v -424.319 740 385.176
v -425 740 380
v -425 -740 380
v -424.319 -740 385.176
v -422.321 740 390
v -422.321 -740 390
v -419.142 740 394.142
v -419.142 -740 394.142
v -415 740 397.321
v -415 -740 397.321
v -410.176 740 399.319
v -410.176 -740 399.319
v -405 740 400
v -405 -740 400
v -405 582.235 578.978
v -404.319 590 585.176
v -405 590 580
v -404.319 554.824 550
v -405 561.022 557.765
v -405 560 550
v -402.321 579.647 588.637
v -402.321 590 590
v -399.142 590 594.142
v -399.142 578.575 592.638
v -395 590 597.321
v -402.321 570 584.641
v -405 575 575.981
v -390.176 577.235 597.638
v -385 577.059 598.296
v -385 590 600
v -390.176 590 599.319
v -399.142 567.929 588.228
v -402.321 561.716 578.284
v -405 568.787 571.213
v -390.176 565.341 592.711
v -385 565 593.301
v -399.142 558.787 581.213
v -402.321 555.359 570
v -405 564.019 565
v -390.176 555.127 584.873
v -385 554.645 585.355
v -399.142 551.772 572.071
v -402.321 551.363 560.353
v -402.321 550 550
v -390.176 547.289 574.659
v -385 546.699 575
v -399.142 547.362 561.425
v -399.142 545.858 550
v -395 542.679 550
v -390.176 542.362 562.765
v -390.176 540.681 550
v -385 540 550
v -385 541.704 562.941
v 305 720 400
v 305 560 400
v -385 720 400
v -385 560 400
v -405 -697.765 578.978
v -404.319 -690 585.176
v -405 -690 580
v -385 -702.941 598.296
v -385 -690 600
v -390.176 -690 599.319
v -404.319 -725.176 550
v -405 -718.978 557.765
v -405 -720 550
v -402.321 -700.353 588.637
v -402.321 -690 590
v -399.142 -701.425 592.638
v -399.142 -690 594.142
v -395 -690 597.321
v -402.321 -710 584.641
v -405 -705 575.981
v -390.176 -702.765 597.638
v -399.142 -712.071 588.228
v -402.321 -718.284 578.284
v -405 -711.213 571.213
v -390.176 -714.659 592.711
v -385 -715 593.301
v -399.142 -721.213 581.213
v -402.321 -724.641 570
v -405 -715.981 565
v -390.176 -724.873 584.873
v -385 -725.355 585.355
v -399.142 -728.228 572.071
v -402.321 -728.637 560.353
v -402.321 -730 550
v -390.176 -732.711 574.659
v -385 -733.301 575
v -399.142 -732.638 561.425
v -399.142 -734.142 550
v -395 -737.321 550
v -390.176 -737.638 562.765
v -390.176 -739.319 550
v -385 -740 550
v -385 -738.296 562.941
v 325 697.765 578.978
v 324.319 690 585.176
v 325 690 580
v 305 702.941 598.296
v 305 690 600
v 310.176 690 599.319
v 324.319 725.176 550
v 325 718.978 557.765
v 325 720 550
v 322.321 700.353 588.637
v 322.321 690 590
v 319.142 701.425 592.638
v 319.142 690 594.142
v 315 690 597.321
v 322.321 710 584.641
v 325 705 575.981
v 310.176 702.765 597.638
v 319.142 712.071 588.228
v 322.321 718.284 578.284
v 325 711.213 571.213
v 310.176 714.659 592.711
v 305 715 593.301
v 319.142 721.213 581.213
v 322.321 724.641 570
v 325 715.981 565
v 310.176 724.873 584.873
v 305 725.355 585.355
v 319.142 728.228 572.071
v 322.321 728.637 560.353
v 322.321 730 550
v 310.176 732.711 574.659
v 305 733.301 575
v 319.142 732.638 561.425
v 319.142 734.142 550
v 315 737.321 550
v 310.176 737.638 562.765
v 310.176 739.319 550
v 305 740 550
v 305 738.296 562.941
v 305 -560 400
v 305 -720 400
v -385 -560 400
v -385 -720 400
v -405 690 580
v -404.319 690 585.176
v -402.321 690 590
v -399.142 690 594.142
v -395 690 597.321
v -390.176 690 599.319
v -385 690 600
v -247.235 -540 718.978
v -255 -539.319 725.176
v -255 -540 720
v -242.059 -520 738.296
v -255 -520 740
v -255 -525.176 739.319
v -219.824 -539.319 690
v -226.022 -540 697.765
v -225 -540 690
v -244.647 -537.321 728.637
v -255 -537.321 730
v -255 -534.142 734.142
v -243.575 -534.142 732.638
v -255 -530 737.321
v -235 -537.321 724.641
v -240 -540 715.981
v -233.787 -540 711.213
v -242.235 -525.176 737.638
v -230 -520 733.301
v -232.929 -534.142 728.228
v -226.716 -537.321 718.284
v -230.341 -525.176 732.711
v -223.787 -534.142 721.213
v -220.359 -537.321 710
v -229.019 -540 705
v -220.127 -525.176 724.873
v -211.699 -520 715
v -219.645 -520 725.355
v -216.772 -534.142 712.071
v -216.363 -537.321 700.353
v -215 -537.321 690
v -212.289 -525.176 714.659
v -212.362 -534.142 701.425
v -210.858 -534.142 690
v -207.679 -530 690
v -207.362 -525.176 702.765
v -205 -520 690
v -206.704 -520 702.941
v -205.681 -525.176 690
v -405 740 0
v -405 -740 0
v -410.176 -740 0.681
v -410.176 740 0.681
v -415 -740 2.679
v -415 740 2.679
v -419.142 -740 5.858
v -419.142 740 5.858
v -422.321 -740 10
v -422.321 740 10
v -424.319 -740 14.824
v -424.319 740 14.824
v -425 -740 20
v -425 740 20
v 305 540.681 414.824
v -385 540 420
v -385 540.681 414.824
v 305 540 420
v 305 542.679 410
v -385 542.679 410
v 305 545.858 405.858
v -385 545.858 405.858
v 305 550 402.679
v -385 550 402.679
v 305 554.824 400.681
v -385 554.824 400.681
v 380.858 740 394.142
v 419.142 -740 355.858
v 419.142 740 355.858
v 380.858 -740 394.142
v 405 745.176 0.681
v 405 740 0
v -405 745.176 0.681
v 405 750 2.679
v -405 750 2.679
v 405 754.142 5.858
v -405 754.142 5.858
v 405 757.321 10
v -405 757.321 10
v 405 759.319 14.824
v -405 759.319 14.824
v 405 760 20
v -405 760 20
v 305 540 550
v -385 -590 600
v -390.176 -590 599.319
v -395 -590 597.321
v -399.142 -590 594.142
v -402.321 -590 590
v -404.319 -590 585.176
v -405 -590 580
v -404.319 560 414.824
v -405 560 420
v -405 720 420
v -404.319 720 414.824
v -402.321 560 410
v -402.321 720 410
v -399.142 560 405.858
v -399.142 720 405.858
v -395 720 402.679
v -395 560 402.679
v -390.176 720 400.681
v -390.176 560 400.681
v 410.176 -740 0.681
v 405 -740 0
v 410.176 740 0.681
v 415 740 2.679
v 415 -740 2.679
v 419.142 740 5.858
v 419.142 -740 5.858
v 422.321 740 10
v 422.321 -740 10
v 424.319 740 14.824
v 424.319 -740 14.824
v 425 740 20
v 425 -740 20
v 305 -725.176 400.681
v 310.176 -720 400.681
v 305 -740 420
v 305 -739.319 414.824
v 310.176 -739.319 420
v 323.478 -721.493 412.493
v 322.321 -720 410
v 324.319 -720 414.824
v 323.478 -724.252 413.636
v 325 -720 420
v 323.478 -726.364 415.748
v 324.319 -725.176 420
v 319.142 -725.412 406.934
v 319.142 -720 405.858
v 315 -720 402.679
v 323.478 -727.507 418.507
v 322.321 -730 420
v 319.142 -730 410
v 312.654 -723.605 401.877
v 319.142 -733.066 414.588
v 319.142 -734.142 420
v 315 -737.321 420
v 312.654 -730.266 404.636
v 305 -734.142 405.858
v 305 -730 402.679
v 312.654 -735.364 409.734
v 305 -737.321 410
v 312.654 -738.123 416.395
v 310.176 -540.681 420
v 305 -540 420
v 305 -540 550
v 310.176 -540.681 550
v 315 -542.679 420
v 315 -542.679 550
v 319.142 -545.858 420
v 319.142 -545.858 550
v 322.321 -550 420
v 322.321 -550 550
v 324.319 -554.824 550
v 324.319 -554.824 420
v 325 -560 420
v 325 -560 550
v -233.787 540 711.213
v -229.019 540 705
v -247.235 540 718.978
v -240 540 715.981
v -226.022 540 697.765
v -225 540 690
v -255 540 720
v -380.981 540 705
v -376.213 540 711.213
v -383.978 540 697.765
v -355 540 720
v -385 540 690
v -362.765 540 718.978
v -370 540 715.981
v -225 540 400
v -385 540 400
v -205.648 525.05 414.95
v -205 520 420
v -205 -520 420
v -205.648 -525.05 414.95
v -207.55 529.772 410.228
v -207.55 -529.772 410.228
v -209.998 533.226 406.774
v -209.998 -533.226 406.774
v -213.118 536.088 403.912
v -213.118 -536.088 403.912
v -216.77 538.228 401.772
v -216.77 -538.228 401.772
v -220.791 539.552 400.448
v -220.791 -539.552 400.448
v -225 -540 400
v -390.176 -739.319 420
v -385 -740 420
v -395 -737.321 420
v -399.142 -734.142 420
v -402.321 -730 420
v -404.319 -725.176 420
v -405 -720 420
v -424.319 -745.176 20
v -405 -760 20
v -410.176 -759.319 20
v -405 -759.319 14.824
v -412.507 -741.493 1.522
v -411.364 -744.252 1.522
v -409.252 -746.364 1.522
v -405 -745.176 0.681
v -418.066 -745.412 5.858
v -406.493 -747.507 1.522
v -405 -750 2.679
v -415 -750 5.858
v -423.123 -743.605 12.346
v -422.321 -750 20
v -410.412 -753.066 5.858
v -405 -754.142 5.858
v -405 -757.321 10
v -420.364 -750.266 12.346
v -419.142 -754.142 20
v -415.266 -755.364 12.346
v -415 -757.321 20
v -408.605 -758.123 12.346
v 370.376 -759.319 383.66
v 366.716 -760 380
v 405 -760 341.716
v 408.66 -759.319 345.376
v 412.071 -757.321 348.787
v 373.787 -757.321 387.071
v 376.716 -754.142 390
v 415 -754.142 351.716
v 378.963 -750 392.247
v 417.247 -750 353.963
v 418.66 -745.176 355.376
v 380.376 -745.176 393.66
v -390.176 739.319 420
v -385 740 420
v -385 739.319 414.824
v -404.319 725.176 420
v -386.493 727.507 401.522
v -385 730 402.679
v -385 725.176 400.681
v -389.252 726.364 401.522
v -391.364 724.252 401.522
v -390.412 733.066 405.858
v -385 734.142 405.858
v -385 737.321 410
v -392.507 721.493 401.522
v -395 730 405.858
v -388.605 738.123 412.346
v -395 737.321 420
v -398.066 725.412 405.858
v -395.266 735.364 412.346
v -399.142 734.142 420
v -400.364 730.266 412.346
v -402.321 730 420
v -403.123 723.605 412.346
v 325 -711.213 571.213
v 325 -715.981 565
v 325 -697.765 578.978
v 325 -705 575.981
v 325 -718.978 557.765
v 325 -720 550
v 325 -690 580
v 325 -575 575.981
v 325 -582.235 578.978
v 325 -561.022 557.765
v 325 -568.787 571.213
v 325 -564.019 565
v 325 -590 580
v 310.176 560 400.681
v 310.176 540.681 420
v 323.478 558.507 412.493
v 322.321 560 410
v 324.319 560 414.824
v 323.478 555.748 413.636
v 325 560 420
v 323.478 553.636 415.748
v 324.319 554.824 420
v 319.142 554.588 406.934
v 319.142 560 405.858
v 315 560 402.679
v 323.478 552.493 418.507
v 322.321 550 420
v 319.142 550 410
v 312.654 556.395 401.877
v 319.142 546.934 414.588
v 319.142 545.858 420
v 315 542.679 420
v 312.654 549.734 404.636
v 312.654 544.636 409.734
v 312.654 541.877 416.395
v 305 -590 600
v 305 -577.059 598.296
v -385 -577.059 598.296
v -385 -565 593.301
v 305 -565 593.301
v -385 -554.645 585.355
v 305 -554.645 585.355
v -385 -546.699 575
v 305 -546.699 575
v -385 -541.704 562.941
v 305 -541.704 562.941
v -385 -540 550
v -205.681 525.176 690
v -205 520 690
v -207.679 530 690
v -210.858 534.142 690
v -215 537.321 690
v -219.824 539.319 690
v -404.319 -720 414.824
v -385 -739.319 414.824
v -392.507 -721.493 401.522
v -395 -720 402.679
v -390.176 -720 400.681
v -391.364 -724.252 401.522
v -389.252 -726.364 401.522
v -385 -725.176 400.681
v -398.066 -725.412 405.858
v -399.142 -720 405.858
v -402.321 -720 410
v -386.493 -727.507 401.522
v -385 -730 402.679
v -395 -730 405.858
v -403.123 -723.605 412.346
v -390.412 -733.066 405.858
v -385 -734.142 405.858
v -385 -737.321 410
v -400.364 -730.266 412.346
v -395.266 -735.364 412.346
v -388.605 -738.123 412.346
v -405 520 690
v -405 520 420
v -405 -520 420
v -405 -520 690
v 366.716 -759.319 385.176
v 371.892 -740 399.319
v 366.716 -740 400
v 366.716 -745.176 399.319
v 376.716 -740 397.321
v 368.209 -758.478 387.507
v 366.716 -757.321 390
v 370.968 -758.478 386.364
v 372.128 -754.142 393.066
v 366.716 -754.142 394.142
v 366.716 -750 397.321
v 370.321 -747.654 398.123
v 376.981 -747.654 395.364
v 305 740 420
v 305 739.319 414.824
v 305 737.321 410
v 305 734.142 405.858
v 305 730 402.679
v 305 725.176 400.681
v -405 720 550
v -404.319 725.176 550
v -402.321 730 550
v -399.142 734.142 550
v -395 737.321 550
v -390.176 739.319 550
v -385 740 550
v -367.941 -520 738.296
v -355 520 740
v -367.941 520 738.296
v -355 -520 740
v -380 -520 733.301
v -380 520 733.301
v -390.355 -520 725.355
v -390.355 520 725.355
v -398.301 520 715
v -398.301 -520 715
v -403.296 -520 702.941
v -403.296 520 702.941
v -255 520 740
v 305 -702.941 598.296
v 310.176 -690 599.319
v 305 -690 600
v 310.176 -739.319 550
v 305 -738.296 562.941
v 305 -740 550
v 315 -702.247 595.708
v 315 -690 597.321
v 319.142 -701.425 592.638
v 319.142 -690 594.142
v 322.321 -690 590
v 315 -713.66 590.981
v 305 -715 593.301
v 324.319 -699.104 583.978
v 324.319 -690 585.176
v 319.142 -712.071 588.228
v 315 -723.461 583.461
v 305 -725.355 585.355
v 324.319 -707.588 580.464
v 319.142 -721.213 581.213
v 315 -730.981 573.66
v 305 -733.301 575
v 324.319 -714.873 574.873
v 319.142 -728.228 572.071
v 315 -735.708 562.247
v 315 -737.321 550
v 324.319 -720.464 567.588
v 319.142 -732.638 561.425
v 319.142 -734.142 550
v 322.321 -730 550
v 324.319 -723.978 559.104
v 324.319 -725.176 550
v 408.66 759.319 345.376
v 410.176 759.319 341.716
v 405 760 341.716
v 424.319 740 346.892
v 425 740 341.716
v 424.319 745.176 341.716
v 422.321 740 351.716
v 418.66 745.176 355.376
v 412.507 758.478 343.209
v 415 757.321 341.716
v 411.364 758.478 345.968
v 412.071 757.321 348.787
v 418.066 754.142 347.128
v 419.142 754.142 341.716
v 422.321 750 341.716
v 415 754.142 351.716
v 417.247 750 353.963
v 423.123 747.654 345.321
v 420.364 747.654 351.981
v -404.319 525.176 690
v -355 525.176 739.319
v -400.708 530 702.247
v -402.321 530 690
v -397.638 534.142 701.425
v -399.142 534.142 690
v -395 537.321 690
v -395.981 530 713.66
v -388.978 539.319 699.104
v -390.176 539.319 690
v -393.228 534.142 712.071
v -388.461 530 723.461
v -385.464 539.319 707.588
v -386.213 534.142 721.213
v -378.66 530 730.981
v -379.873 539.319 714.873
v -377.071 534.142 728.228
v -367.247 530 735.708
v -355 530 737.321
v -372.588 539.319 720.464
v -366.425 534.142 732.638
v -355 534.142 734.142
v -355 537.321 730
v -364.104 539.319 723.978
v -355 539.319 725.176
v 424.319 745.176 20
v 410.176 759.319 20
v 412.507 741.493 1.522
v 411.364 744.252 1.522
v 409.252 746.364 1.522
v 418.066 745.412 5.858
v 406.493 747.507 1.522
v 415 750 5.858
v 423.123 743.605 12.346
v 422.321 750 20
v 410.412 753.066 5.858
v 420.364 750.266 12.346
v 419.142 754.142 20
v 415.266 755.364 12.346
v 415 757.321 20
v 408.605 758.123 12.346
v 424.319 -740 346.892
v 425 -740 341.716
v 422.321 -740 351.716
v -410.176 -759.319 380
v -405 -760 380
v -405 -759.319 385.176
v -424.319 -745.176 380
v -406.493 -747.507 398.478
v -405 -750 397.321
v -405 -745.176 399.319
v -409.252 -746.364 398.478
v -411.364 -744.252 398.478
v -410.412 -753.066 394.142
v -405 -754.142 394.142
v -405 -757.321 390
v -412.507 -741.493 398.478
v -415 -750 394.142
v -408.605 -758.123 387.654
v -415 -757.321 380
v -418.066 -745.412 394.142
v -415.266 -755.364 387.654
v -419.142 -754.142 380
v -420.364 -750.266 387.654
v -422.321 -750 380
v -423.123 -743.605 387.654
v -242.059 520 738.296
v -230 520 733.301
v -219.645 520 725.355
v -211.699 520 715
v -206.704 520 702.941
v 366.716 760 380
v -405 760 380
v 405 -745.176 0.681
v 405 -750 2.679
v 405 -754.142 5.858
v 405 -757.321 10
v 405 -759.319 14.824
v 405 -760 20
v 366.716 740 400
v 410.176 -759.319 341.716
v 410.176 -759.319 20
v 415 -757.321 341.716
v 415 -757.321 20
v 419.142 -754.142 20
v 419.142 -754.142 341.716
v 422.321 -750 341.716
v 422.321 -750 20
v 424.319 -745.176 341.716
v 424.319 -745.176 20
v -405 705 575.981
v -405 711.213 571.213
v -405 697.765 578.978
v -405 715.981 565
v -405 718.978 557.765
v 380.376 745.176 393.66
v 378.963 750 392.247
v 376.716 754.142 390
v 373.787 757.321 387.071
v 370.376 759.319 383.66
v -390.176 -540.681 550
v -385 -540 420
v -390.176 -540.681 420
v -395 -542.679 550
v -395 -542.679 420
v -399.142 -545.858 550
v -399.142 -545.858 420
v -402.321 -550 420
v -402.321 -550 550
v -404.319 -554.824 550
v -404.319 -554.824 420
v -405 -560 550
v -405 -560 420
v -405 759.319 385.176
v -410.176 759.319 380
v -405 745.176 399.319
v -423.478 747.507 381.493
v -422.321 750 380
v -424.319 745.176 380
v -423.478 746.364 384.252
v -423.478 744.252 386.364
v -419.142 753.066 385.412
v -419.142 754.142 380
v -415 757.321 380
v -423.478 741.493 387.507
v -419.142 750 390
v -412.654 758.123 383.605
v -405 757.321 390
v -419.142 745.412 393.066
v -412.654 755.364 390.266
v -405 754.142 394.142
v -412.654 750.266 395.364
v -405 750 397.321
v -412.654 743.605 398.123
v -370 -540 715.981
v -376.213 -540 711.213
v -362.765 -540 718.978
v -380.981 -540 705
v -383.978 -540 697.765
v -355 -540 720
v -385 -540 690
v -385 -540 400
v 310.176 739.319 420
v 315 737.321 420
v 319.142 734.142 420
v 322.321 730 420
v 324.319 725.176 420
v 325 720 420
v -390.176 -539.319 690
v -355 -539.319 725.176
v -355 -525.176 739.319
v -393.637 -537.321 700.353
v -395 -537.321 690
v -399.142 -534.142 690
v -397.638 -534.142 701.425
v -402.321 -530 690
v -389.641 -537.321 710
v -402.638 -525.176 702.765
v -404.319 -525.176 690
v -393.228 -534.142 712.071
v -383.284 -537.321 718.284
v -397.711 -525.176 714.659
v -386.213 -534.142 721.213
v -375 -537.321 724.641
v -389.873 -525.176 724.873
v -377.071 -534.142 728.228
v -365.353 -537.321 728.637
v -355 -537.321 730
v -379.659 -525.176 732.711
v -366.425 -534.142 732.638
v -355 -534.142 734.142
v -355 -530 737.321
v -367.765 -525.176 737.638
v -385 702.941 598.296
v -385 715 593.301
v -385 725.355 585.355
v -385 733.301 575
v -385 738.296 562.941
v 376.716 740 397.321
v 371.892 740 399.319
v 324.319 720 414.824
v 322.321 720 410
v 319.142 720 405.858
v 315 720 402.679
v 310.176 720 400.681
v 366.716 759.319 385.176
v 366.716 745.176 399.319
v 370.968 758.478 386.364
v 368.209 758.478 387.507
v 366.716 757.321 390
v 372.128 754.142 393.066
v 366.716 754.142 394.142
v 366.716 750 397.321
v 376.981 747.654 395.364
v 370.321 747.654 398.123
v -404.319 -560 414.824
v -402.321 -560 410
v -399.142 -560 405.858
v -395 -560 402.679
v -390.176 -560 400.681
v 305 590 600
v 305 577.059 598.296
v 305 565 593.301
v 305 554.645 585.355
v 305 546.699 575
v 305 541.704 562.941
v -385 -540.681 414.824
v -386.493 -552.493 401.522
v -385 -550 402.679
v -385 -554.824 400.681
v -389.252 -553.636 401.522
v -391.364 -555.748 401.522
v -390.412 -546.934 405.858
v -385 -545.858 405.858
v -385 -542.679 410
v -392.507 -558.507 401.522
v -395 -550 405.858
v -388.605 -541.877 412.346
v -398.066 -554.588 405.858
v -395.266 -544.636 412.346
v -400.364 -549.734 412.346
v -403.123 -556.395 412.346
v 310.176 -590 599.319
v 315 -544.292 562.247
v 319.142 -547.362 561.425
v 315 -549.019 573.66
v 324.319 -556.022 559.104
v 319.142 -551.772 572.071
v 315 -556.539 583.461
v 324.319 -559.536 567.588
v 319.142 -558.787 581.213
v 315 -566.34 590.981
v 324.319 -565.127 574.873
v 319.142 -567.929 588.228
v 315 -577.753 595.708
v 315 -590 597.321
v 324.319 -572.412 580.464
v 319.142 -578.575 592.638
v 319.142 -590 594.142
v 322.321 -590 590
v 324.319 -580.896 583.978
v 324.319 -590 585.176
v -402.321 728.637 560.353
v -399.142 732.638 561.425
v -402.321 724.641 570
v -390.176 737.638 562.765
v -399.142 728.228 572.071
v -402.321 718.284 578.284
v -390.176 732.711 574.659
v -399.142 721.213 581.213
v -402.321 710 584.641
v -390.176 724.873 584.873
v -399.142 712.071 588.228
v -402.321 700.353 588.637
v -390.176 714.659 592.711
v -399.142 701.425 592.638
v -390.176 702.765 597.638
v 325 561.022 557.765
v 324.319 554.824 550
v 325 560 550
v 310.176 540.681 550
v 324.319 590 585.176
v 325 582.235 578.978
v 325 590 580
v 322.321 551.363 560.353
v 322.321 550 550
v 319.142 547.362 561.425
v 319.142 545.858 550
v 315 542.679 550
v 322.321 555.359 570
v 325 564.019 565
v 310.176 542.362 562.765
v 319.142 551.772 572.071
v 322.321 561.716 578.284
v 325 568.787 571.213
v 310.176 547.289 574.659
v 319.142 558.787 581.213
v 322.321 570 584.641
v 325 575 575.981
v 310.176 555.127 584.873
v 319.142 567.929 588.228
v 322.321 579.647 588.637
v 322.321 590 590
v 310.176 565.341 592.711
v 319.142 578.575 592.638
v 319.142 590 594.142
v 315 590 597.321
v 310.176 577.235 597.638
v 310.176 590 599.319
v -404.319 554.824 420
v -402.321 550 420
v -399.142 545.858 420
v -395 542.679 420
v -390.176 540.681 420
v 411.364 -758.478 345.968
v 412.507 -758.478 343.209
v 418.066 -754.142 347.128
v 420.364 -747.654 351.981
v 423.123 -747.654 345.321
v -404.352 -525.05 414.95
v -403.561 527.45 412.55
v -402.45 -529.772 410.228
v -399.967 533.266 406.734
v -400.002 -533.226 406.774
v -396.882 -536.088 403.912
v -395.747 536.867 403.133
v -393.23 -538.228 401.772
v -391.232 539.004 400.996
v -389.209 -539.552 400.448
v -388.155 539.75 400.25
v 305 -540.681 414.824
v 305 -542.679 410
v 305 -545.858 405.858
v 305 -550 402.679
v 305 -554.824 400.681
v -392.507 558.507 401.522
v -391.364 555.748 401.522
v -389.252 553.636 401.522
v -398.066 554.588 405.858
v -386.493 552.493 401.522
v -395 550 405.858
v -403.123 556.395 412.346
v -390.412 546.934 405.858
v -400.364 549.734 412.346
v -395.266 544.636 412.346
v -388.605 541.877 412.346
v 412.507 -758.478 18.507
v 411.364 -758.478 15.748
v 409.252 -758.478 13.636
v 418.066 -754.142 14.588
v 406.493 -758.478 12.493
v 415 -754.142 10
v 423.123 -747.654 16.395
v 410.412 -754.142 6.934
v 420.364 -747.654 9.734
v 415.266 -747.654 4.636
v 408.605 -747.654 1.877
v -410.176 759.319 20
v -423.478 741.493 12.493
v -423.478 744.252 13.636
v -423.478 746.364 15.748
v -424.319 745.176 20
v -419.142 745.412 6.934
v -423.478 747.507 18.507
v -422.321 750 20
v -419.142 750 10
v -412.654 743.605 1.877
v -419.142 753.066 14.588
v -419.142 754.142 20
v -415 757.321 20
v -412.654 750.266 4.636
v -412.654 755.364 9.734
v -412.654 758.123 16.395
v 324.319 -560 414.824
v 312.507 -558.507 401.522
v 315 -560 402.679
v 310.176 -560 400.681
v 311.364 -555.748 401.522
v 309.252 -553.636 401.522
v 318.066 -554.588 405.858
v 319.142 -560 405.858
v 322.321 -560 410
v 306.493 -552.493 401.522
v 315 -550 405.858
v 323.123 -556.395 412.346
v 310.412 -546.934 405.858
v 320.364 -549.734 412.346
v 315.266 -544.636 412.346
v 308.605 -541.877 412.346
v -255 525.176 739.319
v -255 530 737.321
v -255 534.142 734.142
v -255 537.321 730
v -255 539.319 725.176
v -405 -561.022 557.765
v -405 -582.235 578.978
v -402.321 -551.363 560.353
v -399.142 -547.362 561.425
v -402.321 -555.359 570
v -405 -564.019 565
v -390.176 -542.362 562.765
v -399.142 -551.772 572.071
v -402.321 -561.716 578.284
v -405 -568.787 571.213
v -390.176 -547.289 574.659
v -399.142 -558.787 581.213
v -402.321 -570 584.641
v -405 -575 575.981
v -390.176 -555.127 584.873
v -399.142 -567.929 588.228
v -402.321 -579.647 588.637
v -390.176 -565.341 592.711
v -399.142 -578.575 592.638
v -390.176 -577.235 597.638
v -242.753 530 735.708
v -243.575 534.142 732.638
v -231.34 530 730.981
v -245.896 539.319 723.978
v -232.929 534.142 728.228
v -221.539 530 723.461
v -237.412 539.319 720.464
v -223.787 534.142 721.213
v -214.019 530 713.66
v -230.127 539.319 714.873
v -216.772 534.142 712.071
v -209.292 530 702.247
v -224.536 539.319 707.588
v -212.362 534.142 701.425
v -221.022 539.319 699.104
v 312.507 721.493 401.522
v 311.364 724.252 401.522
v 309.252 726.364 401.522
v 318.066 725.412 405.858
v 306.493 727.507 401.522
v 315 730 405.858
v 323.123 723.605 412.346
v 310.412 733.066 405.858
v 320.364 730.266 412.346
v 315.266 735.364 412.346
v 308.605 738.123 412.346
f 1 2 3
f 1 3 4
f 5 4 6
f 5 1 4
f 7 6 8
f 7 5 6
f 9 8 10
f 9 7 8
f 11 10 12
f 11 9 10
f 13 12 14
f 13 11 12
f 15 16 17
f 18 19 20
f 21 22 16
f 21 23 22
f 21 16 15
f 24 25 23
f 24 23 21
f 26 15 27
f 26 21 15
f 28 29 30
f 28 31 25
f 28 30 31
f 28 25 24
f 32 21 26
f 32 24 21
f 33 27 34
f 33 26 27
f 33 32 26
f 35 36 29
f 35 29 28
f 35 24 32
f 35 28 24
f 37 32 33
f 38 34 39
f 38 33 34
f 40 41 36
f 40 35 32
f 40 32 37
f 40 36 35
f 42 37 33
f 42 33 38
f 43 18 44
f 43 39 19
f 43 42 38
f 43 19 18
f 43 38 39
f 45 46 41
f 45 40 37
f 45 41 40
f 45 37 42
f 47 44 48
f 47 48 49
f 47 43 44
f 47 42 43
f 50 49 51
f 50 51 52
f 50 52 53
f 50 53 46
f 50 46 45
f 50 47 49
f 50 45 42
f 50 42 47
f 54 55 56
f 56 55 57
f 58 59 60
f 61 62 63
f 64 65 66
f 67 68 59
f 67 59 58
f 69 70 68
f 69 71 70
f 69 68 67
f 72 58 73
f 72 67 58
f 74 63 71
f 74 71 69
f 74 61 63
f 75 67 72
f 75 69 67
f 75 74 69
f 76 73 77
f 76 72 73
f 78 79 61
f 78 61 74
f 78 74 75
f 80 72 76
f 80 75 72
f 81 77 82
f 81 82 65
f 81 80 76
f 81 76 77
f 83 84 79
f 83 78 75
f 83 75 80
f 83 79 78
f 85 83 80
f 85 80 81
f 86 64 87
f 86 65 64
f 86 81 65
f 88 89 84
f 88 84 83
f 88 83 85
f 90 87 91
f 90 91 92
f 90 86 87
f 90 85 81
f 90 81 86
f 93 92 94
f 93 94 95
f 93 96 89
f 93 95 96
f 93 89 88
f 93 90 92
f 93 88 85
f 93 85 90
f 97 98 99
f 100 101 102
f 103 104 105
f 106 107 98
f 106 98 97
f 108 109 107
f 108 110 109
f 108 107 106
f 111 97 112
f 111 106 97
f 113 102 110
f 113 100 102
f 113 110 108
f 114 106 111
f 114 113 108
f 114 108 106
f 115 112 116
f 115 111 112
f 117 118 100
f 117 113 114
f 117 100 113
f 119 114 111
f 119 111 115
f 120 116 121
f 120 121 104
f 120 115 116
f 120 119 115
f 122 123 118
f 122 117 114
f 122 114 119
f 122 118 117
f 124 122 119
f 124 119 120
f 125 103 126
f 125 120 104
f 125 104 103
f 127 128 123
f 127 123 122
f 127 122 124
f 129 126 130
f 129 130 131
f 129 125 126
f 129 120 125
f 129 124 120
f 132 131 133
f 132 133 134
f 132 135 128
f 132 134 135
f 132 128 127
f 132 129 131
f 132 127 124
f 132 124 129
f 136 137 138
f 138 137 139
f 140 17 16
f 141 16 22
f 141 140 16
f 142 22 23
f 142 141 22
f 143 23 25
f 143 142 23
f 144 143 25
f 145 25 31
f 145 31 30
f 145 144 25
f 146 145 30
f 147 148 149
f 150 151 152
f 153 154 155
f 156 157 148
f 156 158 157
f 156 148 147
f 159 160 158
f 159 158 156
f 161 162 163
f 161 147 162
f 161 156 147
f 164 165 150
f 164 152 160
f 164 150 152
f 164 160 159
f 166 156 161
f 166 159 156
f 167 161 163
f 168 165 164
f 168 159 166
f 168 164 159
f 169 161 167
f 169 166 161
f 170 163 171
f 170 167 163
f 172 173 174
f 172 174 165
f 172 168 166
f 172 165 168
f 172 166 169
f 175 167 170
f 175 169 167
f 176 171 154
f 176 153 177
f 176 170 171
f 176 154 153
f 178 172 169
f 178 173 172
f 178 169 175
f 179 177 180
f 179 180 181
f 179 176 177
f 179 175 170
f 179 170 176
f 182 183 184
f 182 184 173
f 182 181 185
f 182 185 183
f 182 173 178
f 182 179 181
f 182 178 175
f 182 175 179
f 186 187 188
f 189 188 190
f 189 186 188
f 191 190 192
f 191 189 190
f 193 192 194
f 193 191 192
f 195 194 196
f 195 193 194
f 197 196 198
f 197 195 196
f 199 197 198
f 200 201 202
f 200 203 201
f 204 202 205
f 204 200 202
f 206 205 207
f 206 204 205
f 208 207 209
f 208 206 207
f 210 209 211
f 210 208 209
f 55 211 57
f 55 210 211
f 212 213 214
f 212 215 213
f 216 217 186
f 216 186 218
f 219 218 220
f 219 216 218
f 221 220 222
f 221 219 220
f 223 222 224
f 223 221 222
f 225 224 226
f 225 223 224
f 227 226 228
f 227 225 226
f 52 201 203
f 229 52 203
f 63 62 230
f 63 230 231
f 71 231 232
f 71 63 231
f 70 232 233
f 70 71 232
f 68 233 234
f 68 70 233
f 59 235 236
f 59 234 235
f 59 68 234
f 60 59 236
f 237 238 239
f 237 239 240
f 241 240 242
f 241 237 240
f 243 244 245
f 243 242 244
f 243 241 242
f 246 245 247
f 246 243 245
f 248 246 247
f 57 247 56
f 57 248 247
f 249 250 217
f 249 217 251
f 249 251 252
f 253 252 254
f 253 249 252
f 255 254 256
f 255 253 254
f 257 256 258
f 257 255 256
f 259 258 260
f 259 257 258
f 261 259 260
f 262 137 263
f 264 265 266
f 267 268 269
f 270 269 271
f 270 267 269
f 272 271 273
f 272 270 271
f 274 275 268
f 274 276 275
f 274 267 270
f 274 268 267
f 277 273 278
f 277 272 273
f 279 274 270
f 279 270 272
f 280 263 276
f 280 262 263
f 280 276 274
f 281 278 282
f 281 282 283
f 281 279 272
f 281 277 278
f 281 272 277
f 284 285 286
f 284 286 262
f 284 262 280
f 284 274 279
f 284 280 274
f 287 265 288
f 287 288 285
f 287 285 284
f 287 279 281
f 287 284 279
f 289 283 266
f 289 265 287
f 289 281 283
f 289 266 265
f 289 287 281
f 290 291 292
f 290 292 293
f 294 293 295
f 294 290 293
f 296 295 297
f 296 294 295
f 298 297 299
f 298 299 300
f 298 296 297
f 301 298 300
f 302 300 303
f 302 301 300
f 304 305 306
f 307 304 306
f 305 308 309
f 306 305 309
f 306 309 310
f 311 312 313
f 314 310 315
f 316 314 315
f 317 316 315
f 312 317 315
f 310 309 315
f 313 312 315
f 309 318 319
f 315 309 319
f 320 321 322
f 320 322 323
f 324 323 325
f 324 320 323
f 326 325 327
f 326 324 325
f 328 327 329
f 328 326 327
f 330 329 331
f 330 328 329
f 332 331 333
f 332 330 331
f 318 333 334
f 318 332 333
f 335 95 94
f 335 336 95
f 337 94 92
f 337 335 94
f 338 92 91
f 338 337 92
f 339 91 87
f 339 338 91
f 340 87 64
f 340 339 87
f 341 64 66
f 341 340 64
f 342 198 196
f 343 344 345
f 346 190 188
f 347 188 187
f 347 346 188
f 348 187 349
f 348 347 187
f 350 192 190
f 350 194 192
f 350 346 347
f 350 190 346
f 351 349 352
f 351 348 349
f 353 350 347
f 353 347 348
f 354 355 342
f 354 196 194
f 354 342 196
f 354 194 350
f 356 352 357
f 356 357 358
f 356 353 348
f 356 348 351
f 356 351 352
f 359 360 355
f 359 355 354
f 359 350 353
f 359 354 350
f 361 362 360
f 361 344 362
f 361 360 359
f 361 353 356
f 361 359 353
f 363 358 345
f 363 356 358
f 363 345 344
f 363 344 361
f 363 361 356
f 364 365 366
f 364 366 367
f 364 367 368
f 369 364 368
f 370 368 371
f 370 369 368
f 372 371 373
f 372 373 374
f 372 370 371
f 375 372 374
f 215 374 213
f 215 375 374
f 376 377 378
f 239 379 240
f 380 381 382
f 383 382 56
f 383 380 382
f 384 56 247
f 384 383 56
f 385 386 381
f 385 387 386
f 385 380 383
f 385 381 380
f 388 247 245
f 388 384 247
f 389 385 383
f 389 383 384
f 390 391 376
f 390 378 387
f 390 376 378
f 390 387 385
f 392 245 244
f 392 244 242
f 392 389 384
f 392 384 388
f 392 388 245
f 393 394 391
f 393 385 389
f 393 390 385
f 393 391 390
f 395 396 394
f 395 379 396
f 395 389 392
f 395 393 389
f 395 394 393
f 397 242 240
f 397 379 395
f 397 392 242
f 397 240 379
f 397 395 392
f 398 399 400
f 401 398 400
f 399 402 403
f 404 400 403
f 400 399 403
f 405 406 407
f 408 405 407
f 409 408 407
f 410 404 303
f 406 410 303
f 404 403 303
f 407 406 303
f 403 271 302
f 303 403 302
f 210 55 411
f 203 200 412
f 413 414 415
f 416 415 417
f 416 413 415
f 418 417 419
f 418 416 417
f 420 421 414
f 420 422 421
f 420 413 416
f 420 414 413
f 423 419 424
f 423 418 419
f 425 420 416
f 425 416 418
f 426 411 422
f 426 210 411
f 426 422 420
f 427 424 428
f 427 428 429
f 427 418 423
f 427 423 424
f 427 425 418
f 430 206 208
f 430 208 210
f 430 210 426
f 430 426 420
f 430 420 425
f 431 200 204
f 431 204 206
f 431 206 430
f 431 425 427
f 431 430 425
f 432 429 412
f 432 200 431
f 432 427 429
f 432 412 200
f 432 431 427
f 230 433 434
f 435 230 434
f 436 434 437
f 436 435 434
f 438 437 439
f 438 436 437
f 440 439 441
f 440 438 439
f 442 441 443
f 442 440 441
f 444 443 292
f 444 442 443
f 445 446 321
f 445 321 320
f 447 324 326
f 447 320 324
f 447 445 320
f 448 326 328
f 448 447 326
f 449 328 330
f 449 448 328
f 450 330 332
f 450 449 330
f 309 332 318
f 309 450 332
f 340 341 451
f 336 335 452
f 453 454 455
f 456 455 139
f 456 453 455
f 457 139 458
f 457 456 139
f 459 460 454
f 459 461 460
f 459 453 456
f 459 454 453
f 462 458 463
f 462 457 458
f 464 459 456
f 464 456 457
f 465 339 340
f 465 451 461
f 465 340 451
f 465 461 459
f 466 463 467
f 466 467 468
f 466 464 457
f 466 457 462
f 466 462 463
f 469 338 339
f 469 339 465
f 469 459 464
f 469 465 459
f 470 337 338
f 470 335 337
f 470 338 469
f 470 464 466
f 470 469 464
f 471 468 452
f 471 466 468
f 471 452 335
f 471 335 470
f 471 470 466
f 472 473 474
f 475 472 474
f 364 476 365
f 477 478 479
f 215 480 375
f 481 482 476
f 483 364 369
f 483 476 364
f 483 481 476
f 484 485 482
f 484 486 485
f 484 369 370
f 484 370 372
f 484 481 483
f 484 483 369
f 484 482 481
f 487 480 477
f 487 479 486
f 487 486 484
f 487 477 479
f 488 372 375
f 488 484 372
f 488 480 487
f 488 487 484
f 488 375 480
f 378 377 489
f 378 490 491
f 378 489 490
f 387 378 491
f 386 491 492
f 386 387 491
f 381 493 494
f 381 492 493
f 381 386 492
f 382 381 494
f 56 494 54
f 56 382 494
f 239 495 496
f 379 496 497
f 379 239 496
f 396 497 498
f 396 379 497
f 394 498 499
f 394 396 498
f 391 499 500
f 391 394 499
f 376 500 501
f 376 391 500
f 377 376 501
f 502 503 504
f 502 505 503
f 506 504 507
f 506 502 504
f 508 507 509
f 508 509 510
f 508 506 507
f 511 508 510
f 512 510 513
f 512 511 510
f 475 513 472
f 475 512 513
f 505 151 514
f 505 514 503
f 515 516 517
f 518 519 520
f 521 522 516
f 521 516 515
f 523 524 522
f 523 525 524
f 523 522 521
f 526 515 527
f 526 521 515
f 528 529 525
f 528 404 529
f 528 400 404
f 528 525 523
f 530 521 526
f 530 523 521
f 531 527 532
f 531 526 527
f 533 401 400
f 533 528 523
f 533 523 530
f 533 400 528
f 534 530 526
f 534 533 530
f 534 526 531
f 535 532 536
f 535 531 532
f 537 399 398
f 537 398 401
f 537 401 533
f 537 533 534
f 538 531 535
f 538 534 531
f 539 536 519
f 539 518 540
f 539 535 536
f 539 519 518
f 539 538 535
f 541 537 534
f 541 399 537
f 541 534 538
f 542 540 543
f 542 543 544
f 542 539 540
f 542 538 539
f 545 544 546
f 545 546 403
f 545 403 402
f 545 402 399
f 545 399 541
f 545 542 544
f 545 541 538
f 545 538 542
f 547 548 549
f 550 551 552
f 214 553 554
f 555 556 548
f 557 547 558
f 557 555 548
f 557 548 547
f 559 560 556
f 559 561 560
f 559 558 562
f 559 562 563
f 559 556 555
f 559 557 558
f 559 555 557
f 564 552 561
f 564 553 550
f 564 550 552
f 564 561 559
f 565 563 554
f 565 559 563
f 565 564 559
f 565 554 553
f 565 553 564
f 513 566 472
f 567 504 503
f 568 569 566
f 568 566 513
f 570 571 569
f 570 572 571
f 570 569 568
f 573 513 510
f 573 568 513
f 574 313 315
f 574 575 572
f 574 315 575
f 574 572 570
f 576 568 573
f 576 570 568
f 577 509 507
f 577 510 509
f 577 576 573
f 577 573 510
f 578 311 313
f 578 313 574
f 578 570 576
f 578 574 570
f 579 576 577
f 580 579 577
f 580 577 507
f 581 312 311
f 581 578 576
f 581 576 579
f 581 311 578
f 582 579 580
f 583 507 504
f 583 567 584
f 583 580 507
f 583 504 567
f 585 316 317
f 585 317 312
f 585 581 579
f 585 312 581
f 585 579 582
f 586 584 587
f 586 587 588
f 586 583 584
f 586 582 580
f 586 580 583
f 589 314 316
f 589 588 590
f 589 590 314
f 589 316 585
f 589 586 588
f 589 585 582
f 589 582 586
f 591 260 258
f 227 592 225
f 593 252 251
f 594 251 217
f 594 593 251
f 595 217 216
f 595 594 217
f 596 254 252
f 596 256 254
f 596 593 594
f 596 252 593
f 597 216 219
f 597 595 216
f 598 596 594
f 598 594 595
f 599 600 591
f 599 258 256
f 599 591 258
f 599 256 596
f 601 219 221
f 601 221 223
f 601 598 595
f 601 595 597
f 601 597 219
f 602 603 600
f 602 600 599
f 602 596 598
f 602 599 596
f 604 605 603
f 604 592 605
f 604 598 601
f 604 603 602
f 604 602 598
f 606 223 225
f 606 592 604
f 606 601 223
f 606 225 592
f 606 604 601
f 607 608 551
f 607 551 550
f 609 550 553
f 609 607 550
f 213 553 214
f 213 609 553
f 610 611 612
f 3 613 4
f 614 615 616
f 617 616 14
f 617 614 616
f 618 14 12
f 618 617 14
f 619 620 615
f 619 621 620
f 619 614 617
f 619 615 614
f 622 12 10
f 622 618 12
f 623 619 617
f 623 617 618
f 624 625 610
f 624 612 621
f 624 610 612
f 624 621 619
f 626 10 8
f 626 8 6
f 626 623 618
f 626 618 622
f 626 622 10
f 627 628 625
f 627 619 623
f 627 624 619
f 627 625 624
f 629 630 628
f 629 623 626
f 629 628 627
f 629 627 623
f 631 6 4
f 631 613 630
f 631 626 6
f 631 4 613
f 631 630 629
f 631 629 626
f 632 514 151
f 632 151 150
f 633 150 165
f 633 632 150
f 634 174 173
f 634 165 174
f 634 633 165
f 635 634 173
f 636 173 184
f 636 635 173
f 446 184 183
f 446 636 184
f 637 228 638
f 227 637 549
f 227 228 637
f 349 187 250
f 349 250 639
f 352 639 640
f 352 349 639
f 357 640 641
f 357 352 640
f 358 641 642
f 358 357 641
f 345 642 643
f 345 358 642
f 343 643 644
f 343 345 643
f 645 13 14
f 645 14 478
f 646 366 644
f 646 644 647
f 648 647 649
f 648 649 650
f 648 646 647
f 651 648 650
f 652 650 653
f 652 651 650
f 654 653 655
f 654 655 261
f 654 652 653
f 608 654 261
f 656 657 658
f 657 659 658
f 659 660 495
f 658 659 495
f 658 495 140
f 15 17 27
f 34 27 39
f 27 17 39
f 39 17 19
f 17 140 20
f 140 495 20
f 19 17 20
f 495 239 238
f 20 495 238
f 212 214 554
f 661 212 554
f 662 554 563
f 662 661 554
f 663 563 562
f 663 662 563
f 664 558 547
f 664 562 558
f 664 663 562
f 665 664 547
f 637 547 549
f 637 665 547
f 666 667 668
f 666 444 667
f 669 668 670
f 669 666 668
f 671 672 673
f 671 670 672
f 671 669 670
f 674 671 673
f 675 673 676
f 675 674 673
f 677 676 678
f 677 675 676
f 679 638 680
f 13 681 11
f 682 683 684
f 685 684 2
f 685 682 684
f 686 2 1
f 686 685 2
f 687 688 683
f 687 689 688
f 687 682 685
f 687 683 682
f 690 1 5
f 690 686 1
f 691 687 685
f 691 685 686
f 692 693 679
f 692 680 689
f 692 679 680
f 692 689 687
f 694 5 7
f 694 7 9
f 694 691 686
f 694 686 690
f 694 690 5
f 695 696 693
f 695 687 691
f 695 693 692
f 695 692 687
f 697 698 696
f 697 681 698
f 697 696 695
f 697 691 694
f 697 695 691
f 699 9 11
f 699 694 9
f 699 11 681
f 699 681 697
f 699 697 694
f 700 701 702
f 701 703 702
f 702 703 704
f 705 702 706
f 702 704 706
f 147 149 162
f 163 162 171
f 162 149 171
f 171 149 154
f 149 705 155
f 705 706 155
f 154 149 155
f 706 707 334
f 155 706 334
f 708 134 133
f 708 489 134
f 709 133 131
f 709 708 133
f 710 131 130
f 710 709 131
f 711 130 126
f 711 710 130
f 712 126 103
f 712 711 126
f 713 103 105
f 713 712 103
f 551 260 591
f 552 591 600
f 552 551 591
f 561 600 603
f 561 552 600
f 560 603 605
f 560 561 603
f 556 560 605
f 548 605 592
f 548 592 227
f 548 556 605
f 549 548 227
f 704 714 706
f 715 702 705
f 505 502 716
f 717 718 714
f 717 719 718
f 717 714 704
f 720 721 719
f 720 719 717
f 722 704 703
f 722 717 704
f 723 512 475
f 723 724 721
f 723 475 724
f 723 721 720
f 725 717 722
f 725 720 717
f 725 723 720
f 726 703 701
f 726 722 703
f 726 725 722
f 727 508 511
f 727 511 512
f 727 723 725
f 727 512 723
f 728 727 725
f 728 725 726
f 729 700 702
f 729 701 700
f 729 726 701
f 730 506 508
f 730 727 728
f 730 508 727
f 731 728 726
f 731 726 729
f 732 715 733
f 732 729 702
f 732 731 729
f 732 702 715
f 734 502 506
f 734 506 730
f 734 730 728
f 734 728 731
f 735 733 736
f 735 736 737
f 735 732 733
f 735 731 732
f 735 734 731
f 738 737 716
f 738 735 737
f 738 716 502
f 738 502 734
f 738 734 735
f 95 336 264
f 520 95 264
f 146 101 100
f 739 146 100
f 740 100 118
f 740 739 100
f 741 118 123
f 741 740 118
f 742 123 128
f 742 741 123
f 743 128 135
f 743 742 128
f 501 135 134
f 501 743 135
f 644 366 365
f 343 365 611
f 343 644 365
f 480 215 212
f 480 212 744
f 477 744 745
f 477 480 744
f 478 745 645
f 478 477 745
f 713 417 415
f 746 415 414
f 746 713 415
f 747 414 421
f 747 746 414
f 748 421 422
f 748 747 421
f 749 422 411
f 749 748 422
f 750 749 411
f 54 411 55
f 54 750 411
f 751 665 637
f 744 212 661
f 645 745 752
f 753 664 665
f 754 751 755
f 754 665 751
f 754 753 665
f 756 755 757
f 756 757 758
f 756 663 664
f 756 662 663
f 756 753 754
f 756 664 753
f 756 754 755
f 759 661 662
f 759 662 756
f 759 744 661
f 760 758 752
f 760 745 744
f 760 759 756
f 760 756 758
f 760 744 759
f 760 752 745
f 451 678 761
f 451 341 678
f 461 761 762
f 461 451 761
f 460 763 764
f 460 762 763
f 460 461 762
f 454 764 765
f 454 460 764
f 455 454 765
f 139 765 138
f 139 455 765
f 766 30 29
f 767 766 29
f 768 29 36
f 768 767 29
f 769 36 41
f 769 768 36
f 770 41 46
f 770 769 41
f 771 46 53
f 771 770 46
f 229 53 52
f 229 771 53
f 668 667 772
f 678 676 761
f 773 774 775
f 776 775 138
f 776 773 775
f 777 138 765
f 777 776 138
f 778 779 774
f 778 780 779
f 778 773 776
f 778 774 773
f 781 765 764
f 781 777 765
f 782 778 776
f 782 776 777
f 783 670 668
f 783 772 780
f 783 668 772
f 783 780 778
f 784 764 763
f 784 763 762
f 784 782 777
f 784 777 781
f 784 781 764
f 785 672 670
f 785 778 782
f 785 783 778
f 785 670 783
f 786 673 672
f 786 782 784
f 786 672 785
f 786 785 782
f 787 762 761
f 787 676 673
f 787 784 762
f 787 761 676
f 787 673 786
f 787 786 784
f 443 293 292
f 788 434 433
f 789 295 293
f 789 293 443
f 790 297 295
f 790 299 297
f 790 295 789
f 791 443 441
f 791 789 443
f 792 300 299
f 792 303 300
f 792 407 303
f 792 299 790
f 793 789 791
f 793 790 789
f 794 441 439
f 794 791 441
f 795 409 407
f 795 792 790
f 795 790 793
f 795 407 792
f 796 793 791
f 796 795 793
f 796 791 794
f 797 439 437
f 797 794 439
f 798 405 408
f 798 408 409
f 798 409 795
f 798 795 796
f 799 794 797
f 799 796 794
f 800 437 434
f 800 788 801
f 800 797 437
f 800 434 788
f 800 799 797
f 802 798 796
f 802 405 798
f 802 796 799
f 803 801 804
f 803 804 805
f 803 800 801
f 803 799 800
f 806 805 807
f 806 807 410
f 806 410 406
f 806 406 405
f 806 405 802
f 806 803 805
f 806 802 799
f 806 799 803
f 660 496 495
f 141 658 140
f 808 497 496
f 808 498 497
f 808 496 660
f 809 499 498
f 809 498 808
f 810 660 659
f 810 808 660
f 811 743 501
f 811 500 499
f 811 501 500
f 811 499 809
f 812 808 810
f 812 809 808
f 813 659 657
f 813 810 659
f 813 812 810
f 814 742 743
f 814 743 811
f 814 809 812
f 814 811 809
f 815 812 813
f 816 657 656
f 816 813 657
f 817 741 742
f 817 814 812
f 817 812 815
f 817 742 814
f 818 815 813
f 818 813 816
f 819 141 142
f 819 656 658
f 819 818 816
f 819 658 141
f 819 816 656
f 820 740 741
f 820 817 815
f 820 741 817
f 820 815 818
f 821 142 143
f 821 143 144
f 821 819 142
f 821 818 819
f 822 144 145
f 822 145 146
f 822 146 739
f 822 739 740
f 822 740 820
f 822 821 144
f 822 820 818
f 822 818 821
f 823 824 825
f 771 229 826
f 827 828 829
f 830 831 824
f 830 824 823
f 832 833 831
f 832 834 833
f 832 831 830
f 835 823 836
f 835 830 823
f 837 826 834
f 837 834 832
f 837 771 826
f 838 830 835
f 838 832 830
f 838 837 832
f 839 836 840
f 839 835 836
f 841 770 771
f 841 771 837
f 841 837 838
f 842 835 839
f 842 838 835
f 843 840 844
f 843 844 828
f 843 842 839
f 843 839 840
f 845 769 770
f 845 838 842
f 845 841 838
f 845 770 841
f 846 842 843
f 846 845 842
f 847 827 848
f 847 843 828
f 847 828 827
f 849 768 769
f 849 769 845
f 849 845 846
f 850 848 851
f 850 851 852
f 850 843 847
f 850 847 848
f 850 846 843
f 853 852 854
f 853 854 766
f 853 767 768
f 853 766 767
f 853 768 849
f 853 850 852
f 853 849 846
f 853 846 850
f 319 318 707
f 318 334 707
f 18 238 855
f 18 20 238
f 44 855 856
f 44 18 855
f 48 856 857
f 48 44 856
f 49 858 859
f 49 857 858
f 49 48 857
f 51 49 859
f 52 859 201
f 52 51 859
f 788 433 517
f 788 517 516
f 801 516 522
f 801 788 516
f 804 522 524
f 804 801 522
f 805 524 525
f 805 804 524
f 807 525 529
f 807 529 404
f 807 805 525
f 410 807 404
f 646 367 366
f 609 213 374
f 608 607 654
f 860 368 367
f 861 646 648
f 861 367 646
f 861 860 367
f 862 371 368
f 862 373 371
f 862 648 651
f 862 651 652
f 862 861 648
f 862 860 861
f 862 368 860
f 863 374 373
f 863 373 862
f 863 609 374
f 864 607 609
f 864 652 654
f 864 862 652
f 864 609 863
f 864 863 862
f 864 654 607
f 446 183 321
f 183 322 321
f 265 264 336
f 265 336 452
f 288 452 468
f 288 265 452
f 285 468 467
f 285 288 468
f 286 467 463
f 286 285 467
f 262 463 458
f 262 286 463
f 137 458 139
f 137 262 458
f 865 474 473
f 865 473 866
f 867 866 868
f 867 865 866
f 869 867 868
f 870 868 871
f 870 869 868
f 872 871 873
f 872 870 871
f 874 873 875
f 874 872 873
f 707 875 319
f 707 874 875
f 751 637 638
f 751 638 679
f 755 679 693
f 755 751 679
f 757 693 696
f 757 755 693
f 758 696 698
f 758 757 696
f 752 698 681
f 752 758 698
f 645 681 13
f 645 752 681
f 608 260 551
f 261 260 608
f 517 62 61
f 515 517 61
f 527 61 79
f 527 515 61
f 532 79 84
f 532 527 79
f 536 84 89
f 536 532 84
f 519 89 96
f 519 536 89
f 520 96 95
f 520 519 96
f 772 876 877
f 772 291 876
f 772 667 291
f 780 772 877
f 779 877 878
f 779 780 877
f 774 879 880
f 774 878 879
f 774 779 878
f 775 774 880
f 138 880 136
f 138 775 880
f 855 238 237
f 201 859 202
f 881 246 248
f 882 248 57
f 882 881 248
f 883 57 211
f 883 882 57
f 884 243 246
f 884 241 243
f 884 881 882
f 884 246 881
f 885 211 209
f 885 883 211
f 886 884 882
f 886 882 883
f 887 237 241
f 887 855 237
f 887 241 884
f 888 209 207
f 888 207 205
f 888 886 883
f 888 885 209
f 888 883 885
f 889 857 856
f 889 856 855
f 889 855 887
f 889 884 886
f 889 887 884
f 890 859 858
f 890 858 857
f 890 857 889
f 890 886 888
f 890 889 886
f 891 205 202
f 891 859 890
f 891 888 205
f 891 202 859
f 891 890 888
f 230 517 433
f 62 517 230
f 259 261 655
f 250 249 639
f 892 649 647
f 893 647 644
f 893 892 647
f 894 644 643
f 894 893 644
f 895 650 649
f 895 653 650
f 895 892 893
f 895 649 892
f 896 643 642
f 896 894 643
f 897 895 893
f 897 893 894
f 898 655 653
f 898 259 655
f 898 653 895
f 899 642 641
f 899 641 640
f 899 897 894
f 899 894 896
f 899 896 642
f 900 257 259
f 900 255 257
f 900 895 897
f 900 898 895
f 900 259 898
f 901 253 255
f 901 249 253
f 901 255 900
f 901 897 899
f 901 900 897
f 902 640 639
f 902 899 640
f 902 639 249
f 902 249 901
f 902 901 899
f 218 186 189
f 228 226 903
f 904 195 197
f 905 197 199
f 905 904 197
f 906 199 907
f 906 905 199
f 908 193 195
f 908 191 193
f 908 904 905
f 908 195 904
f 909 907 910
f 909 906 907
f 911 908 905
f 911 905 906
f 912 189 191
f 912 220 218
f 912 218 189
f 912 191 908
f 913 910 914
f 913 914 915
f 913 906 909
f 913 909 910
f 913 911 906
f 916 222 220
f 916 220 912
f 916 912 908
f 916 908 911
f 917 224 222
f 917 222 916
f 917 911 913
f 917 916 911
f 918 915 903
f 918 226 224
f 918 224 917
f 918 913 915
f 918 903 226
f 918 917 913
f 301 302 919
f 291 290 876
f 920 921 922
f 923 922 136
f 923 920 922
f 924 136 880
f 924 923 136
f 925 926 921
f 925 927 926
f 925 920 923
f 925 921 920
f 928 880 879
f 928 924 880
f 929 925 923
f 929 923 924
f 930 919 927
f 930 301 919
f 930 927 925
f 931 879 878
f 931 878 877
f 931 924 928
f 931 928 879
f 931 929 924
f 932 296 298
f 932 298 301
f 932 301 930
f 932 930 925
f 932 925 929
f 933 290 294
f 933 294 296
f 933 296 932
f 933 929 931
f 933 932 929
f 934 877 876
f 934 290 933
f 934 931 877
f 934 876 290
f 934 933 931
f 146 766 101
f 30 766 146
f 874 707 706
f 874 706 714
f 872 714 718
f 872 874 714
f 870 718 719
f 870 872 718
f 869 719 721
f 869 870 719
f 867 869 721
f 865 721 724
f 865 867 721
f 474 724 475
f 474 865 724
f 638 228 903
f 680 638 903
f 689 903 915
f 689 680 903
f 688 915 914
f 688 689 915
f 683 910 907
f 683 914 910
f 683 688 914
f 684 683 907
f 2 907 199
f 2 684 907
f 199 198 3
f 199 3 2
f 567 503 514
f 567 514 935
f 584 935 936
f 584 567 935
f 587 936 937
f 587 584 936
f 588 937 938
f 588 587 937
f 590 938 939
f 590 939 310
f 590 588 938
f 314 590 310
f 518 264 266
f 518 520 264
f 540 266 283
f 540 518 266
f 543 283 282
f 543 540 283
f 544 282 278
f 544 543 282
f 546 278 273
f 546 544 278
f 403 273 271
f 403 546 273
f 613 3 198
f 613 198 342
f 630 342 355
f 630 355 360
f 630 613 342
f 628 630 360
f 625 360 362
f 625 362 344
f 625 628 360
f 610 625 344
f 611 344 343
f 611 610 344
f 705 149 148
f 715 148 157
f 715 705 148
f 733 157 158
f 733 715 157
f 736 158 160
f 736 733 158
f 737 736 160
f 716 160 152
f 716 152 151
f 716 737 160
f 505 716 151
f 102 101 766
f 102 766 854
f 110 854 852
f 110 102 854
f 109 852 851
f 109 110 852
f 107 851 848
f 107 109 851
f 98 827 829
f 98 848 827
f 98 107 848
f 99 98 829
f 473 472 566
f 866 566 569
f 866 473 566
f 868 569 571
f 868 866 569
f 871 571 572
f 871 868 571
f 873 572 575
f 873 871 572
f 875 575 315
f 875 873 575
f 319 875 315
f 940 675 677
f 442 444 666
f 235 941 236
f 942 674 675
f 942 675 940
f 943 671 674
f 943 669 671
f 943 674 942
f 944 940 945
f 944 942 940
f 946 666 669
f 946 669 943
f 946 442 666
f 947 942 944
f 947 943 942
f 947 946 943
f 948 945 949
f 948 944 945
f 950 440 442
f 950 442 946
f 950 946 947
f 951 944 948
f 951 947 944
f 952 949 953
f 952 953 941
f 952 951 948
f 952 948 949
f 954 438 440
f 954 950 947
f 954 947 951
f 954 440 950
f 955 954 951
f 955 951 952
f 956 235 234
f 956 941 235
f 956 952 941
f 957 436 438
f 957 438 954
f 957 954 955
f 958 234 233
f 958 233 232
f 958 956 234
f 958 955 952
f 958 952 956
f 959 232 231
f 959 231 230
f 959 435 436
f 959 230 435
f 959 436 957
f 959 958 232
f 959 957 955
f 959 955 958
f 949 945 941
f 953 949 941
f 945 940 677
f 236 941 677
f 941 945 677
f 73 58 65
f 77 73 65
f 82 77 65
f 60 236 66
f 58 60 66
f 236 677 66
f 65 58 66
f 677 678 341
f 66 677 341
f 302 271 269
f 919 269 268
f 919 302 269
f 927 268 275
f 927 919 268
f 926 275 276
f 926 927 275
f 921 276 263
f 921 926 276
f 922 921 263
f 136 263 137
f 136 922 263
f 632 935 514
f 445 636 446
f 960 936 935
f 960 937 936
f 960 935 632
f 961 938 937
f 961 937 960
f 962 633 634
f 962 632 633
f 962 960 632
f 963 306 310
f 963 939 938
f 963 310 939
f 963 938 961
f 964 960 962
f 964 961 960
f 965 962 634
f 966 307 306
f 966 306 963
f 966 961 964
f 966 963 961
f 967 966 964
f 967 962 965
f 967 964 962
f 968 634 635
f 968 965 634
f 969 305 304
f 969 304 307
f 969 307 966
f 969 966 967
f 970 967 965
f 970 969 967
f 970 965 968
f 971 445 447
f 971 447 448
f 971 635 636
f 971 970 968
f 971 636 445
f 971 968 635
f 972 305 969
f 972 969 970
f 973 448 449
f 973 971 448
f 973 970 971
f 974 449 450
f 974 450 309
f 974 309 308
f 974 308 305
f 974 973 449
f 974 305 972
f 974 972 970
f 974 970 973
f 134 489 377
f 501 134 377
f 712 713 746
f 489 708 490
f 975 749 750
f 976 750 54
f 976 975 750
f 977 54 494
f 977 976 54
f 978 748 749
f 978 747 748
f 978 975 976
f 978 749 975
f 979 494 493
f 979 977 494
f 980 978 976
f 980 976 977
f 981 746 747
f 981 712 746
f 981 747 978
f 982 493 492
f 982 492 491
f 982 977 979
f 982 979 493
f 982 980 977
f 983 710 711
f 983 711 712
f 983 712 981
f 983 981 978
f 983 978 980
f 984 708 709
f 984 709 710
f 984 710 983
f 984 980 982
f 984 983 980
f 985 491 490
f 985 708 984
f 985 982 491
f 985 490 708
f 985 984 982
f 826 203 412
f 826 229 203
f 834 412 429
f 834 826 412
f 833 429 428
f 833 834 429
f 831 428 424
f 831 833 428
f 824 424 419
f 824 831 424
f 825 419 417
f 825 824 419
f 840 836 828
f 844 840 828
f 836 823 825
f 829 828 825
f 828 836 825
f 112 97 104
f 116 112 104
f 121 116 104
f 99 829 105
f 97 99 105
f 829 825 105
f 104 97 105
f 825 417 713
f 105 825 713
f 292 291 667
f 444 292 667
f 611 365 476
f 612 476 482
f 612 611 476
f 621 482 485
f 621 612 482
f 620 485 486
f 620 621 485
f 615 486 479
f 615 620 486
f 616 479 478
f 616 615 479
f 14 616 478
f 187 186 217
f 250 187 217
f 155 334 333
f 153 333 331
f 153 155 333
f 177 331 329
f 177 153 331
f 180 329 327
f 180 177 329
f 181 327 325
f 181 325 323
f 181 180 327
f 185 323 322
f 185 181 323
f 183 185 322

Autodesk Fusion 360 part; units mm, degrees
sketch "Sketch1" plane through (0, 0, 0) normal (0, 0, 1) x (1, 0, 0)
  line L0 (425, -760) -> (-425, -760)
  line L1 (-425, -760) -> (-425, 760)
  line L2 (-425, 760) -> (425, 760)
  line L3 (425, 760) -> (425, -760)
  line L4 (425, -760) -> (-425, 760) construction
  line L5 (-425, -760) -> (425, 760) construction
  line L6 (-405, -740) -> (325, -740)
  line L7 (325, -740) -> (325, -540)
  line L8 (325, -540) -> (-405, -540)
  line L9 (-405, -540) -> (-405, -740)
  line L10 (-405, -540) -> (-205, -540)
  line L11 (-205, -540) -> (-205, 540)
  line L12 (-205, 540) -> (-405, 540)
  line L13 (-405, 540) -> (-405, -540)
  line L14 (-405, 540) -> (325, 540)
  line L15 (325, 540) -> (325, 740)
  line L16 (325, 740) -> (-405, 740)
  line L17 (-405, 740) -> (-405, 540)
  dimension "d1" = 1520
  dimension "d2" = 850
  dimension "d3" = 20
  dimension "d4" = 20
  dimension "d5" = 20
  dimension "d6" = 200
  dimension "d7" = 200
  dimension "d8" = 100
extrude "Extrude1" add sketch "Sketch1" along normal blind 400 contours L0 L1 L2 L3 | L6 L7 L8 L9 L10 | L8 L10 L11 L12 L13 L14 | L12 L14 L15 L16 L17 makes body 1
sketch "Sketch2" plane through (0, 0, 400) normal (0, 0, 1) x (-1, 0, 0)
  line L0 (-425, -760) -> (425, -760)
  line L1 (425, -760) -> (425, 760)
  line L2 (425, 760) -> (-425, 760)
  line L3 (-425, 760) -> (-425, -760)
  line L4 (405, 740) -> (-325, 740)
  line L5 (-325, 540) -> (405, 540)
  line L6 (405, 540) -> (405, 740)
  line L7 (-325, 740) -> (-325, 540)
  line L8 (405, -740) -> (405, -540)
  line L9 (405, -540) -> (-325, -540)
  line L10 (-325, -740) -> (405, -740)
  line L11 (-325, -540) -> (-325, -740)
extrude "Extrude2" add sketch "Sketch2" along normal blind 200 separate body contours L4 L5 L6 L7 | L8 L9 L10 L11 makes body 2 at (81.6667, -540, 466.6667) makes body 3 at (-161.6667, 540, 466.6667)
sketch "Sketch3" plane through (0, 0, 400) normal (0, 0, 1) x (-1, 0, 0)
  line L0 (-425, -760) -> (425, -760)
  line L1 (425, -760) -> (425, 760)
  line L2 (425, 760) -> (-425, 760)
  line L3 (-425, 760) -> (-425, -760)
  line L4 (205, 540) -> (205, -540)
  line L5 (205, -540) -> (405, -540)
  line L6 (405, 540) -> (205, 540)
  line L7 (405, -540) -> (405, 540)
extrude "Extrude3" add sketch "Sketch3" along normal blind 340 separate body contours L4 L5 L6 L7 makes body 4
chamfer "Chamfer2" distance 50 angle 45 1 edges at (425, 0, 400) on bodies 1
fillet "Fillet2" radius 20 7 faces at (425, 253.3333, 116.6667) (391.6667, 253.3333, 383.3333) (125, 760, 133.3333) (-425, -253.3333, 133.3333) (125, -760, 133.3333) (-141.6667, 253.3333, 0) (-158.3333, 253.3333, 400) on bodies 1
fillet "Fillet3" radius 50 6 edges at (-40, -740, 600) (-40, -540, 600) (-40, 540, 600) (-40, 740, 600) (-205, 0, 740) (-405, 0, 740) on bodies 2 3 4
fillet "Fillet4" radius 20 21 faces at (-405, -606.6667, 450) (-161.6667, -740, 450) (-161.6667, -692.3791, 599.9434) (81.6667, -656.6667, 600) (81.6667, -587.6209, 599.9434) (81.6667, -540, 450) (325, -673.3333, 450) (-161.6667, 540, 450) (-161.6667, 585.2472, 599.7736) (81.6667, 623.3333, 600) (81.6667, 692.3791, 599.9434) (81.6667, 740, 450) (325, 606.6667, 450) (-405, 673.3333, 450) (-205, -180, 593.3333) (-220.496, -180, 726.1867) (-288.3333, 180, 740) (-366.7879, 180, 738.5906) (-405, 180, 593.3333) (-271.6667, 540, 496.6667) (-338.3333, -540, 496.6667) on bodies 2 3 4
